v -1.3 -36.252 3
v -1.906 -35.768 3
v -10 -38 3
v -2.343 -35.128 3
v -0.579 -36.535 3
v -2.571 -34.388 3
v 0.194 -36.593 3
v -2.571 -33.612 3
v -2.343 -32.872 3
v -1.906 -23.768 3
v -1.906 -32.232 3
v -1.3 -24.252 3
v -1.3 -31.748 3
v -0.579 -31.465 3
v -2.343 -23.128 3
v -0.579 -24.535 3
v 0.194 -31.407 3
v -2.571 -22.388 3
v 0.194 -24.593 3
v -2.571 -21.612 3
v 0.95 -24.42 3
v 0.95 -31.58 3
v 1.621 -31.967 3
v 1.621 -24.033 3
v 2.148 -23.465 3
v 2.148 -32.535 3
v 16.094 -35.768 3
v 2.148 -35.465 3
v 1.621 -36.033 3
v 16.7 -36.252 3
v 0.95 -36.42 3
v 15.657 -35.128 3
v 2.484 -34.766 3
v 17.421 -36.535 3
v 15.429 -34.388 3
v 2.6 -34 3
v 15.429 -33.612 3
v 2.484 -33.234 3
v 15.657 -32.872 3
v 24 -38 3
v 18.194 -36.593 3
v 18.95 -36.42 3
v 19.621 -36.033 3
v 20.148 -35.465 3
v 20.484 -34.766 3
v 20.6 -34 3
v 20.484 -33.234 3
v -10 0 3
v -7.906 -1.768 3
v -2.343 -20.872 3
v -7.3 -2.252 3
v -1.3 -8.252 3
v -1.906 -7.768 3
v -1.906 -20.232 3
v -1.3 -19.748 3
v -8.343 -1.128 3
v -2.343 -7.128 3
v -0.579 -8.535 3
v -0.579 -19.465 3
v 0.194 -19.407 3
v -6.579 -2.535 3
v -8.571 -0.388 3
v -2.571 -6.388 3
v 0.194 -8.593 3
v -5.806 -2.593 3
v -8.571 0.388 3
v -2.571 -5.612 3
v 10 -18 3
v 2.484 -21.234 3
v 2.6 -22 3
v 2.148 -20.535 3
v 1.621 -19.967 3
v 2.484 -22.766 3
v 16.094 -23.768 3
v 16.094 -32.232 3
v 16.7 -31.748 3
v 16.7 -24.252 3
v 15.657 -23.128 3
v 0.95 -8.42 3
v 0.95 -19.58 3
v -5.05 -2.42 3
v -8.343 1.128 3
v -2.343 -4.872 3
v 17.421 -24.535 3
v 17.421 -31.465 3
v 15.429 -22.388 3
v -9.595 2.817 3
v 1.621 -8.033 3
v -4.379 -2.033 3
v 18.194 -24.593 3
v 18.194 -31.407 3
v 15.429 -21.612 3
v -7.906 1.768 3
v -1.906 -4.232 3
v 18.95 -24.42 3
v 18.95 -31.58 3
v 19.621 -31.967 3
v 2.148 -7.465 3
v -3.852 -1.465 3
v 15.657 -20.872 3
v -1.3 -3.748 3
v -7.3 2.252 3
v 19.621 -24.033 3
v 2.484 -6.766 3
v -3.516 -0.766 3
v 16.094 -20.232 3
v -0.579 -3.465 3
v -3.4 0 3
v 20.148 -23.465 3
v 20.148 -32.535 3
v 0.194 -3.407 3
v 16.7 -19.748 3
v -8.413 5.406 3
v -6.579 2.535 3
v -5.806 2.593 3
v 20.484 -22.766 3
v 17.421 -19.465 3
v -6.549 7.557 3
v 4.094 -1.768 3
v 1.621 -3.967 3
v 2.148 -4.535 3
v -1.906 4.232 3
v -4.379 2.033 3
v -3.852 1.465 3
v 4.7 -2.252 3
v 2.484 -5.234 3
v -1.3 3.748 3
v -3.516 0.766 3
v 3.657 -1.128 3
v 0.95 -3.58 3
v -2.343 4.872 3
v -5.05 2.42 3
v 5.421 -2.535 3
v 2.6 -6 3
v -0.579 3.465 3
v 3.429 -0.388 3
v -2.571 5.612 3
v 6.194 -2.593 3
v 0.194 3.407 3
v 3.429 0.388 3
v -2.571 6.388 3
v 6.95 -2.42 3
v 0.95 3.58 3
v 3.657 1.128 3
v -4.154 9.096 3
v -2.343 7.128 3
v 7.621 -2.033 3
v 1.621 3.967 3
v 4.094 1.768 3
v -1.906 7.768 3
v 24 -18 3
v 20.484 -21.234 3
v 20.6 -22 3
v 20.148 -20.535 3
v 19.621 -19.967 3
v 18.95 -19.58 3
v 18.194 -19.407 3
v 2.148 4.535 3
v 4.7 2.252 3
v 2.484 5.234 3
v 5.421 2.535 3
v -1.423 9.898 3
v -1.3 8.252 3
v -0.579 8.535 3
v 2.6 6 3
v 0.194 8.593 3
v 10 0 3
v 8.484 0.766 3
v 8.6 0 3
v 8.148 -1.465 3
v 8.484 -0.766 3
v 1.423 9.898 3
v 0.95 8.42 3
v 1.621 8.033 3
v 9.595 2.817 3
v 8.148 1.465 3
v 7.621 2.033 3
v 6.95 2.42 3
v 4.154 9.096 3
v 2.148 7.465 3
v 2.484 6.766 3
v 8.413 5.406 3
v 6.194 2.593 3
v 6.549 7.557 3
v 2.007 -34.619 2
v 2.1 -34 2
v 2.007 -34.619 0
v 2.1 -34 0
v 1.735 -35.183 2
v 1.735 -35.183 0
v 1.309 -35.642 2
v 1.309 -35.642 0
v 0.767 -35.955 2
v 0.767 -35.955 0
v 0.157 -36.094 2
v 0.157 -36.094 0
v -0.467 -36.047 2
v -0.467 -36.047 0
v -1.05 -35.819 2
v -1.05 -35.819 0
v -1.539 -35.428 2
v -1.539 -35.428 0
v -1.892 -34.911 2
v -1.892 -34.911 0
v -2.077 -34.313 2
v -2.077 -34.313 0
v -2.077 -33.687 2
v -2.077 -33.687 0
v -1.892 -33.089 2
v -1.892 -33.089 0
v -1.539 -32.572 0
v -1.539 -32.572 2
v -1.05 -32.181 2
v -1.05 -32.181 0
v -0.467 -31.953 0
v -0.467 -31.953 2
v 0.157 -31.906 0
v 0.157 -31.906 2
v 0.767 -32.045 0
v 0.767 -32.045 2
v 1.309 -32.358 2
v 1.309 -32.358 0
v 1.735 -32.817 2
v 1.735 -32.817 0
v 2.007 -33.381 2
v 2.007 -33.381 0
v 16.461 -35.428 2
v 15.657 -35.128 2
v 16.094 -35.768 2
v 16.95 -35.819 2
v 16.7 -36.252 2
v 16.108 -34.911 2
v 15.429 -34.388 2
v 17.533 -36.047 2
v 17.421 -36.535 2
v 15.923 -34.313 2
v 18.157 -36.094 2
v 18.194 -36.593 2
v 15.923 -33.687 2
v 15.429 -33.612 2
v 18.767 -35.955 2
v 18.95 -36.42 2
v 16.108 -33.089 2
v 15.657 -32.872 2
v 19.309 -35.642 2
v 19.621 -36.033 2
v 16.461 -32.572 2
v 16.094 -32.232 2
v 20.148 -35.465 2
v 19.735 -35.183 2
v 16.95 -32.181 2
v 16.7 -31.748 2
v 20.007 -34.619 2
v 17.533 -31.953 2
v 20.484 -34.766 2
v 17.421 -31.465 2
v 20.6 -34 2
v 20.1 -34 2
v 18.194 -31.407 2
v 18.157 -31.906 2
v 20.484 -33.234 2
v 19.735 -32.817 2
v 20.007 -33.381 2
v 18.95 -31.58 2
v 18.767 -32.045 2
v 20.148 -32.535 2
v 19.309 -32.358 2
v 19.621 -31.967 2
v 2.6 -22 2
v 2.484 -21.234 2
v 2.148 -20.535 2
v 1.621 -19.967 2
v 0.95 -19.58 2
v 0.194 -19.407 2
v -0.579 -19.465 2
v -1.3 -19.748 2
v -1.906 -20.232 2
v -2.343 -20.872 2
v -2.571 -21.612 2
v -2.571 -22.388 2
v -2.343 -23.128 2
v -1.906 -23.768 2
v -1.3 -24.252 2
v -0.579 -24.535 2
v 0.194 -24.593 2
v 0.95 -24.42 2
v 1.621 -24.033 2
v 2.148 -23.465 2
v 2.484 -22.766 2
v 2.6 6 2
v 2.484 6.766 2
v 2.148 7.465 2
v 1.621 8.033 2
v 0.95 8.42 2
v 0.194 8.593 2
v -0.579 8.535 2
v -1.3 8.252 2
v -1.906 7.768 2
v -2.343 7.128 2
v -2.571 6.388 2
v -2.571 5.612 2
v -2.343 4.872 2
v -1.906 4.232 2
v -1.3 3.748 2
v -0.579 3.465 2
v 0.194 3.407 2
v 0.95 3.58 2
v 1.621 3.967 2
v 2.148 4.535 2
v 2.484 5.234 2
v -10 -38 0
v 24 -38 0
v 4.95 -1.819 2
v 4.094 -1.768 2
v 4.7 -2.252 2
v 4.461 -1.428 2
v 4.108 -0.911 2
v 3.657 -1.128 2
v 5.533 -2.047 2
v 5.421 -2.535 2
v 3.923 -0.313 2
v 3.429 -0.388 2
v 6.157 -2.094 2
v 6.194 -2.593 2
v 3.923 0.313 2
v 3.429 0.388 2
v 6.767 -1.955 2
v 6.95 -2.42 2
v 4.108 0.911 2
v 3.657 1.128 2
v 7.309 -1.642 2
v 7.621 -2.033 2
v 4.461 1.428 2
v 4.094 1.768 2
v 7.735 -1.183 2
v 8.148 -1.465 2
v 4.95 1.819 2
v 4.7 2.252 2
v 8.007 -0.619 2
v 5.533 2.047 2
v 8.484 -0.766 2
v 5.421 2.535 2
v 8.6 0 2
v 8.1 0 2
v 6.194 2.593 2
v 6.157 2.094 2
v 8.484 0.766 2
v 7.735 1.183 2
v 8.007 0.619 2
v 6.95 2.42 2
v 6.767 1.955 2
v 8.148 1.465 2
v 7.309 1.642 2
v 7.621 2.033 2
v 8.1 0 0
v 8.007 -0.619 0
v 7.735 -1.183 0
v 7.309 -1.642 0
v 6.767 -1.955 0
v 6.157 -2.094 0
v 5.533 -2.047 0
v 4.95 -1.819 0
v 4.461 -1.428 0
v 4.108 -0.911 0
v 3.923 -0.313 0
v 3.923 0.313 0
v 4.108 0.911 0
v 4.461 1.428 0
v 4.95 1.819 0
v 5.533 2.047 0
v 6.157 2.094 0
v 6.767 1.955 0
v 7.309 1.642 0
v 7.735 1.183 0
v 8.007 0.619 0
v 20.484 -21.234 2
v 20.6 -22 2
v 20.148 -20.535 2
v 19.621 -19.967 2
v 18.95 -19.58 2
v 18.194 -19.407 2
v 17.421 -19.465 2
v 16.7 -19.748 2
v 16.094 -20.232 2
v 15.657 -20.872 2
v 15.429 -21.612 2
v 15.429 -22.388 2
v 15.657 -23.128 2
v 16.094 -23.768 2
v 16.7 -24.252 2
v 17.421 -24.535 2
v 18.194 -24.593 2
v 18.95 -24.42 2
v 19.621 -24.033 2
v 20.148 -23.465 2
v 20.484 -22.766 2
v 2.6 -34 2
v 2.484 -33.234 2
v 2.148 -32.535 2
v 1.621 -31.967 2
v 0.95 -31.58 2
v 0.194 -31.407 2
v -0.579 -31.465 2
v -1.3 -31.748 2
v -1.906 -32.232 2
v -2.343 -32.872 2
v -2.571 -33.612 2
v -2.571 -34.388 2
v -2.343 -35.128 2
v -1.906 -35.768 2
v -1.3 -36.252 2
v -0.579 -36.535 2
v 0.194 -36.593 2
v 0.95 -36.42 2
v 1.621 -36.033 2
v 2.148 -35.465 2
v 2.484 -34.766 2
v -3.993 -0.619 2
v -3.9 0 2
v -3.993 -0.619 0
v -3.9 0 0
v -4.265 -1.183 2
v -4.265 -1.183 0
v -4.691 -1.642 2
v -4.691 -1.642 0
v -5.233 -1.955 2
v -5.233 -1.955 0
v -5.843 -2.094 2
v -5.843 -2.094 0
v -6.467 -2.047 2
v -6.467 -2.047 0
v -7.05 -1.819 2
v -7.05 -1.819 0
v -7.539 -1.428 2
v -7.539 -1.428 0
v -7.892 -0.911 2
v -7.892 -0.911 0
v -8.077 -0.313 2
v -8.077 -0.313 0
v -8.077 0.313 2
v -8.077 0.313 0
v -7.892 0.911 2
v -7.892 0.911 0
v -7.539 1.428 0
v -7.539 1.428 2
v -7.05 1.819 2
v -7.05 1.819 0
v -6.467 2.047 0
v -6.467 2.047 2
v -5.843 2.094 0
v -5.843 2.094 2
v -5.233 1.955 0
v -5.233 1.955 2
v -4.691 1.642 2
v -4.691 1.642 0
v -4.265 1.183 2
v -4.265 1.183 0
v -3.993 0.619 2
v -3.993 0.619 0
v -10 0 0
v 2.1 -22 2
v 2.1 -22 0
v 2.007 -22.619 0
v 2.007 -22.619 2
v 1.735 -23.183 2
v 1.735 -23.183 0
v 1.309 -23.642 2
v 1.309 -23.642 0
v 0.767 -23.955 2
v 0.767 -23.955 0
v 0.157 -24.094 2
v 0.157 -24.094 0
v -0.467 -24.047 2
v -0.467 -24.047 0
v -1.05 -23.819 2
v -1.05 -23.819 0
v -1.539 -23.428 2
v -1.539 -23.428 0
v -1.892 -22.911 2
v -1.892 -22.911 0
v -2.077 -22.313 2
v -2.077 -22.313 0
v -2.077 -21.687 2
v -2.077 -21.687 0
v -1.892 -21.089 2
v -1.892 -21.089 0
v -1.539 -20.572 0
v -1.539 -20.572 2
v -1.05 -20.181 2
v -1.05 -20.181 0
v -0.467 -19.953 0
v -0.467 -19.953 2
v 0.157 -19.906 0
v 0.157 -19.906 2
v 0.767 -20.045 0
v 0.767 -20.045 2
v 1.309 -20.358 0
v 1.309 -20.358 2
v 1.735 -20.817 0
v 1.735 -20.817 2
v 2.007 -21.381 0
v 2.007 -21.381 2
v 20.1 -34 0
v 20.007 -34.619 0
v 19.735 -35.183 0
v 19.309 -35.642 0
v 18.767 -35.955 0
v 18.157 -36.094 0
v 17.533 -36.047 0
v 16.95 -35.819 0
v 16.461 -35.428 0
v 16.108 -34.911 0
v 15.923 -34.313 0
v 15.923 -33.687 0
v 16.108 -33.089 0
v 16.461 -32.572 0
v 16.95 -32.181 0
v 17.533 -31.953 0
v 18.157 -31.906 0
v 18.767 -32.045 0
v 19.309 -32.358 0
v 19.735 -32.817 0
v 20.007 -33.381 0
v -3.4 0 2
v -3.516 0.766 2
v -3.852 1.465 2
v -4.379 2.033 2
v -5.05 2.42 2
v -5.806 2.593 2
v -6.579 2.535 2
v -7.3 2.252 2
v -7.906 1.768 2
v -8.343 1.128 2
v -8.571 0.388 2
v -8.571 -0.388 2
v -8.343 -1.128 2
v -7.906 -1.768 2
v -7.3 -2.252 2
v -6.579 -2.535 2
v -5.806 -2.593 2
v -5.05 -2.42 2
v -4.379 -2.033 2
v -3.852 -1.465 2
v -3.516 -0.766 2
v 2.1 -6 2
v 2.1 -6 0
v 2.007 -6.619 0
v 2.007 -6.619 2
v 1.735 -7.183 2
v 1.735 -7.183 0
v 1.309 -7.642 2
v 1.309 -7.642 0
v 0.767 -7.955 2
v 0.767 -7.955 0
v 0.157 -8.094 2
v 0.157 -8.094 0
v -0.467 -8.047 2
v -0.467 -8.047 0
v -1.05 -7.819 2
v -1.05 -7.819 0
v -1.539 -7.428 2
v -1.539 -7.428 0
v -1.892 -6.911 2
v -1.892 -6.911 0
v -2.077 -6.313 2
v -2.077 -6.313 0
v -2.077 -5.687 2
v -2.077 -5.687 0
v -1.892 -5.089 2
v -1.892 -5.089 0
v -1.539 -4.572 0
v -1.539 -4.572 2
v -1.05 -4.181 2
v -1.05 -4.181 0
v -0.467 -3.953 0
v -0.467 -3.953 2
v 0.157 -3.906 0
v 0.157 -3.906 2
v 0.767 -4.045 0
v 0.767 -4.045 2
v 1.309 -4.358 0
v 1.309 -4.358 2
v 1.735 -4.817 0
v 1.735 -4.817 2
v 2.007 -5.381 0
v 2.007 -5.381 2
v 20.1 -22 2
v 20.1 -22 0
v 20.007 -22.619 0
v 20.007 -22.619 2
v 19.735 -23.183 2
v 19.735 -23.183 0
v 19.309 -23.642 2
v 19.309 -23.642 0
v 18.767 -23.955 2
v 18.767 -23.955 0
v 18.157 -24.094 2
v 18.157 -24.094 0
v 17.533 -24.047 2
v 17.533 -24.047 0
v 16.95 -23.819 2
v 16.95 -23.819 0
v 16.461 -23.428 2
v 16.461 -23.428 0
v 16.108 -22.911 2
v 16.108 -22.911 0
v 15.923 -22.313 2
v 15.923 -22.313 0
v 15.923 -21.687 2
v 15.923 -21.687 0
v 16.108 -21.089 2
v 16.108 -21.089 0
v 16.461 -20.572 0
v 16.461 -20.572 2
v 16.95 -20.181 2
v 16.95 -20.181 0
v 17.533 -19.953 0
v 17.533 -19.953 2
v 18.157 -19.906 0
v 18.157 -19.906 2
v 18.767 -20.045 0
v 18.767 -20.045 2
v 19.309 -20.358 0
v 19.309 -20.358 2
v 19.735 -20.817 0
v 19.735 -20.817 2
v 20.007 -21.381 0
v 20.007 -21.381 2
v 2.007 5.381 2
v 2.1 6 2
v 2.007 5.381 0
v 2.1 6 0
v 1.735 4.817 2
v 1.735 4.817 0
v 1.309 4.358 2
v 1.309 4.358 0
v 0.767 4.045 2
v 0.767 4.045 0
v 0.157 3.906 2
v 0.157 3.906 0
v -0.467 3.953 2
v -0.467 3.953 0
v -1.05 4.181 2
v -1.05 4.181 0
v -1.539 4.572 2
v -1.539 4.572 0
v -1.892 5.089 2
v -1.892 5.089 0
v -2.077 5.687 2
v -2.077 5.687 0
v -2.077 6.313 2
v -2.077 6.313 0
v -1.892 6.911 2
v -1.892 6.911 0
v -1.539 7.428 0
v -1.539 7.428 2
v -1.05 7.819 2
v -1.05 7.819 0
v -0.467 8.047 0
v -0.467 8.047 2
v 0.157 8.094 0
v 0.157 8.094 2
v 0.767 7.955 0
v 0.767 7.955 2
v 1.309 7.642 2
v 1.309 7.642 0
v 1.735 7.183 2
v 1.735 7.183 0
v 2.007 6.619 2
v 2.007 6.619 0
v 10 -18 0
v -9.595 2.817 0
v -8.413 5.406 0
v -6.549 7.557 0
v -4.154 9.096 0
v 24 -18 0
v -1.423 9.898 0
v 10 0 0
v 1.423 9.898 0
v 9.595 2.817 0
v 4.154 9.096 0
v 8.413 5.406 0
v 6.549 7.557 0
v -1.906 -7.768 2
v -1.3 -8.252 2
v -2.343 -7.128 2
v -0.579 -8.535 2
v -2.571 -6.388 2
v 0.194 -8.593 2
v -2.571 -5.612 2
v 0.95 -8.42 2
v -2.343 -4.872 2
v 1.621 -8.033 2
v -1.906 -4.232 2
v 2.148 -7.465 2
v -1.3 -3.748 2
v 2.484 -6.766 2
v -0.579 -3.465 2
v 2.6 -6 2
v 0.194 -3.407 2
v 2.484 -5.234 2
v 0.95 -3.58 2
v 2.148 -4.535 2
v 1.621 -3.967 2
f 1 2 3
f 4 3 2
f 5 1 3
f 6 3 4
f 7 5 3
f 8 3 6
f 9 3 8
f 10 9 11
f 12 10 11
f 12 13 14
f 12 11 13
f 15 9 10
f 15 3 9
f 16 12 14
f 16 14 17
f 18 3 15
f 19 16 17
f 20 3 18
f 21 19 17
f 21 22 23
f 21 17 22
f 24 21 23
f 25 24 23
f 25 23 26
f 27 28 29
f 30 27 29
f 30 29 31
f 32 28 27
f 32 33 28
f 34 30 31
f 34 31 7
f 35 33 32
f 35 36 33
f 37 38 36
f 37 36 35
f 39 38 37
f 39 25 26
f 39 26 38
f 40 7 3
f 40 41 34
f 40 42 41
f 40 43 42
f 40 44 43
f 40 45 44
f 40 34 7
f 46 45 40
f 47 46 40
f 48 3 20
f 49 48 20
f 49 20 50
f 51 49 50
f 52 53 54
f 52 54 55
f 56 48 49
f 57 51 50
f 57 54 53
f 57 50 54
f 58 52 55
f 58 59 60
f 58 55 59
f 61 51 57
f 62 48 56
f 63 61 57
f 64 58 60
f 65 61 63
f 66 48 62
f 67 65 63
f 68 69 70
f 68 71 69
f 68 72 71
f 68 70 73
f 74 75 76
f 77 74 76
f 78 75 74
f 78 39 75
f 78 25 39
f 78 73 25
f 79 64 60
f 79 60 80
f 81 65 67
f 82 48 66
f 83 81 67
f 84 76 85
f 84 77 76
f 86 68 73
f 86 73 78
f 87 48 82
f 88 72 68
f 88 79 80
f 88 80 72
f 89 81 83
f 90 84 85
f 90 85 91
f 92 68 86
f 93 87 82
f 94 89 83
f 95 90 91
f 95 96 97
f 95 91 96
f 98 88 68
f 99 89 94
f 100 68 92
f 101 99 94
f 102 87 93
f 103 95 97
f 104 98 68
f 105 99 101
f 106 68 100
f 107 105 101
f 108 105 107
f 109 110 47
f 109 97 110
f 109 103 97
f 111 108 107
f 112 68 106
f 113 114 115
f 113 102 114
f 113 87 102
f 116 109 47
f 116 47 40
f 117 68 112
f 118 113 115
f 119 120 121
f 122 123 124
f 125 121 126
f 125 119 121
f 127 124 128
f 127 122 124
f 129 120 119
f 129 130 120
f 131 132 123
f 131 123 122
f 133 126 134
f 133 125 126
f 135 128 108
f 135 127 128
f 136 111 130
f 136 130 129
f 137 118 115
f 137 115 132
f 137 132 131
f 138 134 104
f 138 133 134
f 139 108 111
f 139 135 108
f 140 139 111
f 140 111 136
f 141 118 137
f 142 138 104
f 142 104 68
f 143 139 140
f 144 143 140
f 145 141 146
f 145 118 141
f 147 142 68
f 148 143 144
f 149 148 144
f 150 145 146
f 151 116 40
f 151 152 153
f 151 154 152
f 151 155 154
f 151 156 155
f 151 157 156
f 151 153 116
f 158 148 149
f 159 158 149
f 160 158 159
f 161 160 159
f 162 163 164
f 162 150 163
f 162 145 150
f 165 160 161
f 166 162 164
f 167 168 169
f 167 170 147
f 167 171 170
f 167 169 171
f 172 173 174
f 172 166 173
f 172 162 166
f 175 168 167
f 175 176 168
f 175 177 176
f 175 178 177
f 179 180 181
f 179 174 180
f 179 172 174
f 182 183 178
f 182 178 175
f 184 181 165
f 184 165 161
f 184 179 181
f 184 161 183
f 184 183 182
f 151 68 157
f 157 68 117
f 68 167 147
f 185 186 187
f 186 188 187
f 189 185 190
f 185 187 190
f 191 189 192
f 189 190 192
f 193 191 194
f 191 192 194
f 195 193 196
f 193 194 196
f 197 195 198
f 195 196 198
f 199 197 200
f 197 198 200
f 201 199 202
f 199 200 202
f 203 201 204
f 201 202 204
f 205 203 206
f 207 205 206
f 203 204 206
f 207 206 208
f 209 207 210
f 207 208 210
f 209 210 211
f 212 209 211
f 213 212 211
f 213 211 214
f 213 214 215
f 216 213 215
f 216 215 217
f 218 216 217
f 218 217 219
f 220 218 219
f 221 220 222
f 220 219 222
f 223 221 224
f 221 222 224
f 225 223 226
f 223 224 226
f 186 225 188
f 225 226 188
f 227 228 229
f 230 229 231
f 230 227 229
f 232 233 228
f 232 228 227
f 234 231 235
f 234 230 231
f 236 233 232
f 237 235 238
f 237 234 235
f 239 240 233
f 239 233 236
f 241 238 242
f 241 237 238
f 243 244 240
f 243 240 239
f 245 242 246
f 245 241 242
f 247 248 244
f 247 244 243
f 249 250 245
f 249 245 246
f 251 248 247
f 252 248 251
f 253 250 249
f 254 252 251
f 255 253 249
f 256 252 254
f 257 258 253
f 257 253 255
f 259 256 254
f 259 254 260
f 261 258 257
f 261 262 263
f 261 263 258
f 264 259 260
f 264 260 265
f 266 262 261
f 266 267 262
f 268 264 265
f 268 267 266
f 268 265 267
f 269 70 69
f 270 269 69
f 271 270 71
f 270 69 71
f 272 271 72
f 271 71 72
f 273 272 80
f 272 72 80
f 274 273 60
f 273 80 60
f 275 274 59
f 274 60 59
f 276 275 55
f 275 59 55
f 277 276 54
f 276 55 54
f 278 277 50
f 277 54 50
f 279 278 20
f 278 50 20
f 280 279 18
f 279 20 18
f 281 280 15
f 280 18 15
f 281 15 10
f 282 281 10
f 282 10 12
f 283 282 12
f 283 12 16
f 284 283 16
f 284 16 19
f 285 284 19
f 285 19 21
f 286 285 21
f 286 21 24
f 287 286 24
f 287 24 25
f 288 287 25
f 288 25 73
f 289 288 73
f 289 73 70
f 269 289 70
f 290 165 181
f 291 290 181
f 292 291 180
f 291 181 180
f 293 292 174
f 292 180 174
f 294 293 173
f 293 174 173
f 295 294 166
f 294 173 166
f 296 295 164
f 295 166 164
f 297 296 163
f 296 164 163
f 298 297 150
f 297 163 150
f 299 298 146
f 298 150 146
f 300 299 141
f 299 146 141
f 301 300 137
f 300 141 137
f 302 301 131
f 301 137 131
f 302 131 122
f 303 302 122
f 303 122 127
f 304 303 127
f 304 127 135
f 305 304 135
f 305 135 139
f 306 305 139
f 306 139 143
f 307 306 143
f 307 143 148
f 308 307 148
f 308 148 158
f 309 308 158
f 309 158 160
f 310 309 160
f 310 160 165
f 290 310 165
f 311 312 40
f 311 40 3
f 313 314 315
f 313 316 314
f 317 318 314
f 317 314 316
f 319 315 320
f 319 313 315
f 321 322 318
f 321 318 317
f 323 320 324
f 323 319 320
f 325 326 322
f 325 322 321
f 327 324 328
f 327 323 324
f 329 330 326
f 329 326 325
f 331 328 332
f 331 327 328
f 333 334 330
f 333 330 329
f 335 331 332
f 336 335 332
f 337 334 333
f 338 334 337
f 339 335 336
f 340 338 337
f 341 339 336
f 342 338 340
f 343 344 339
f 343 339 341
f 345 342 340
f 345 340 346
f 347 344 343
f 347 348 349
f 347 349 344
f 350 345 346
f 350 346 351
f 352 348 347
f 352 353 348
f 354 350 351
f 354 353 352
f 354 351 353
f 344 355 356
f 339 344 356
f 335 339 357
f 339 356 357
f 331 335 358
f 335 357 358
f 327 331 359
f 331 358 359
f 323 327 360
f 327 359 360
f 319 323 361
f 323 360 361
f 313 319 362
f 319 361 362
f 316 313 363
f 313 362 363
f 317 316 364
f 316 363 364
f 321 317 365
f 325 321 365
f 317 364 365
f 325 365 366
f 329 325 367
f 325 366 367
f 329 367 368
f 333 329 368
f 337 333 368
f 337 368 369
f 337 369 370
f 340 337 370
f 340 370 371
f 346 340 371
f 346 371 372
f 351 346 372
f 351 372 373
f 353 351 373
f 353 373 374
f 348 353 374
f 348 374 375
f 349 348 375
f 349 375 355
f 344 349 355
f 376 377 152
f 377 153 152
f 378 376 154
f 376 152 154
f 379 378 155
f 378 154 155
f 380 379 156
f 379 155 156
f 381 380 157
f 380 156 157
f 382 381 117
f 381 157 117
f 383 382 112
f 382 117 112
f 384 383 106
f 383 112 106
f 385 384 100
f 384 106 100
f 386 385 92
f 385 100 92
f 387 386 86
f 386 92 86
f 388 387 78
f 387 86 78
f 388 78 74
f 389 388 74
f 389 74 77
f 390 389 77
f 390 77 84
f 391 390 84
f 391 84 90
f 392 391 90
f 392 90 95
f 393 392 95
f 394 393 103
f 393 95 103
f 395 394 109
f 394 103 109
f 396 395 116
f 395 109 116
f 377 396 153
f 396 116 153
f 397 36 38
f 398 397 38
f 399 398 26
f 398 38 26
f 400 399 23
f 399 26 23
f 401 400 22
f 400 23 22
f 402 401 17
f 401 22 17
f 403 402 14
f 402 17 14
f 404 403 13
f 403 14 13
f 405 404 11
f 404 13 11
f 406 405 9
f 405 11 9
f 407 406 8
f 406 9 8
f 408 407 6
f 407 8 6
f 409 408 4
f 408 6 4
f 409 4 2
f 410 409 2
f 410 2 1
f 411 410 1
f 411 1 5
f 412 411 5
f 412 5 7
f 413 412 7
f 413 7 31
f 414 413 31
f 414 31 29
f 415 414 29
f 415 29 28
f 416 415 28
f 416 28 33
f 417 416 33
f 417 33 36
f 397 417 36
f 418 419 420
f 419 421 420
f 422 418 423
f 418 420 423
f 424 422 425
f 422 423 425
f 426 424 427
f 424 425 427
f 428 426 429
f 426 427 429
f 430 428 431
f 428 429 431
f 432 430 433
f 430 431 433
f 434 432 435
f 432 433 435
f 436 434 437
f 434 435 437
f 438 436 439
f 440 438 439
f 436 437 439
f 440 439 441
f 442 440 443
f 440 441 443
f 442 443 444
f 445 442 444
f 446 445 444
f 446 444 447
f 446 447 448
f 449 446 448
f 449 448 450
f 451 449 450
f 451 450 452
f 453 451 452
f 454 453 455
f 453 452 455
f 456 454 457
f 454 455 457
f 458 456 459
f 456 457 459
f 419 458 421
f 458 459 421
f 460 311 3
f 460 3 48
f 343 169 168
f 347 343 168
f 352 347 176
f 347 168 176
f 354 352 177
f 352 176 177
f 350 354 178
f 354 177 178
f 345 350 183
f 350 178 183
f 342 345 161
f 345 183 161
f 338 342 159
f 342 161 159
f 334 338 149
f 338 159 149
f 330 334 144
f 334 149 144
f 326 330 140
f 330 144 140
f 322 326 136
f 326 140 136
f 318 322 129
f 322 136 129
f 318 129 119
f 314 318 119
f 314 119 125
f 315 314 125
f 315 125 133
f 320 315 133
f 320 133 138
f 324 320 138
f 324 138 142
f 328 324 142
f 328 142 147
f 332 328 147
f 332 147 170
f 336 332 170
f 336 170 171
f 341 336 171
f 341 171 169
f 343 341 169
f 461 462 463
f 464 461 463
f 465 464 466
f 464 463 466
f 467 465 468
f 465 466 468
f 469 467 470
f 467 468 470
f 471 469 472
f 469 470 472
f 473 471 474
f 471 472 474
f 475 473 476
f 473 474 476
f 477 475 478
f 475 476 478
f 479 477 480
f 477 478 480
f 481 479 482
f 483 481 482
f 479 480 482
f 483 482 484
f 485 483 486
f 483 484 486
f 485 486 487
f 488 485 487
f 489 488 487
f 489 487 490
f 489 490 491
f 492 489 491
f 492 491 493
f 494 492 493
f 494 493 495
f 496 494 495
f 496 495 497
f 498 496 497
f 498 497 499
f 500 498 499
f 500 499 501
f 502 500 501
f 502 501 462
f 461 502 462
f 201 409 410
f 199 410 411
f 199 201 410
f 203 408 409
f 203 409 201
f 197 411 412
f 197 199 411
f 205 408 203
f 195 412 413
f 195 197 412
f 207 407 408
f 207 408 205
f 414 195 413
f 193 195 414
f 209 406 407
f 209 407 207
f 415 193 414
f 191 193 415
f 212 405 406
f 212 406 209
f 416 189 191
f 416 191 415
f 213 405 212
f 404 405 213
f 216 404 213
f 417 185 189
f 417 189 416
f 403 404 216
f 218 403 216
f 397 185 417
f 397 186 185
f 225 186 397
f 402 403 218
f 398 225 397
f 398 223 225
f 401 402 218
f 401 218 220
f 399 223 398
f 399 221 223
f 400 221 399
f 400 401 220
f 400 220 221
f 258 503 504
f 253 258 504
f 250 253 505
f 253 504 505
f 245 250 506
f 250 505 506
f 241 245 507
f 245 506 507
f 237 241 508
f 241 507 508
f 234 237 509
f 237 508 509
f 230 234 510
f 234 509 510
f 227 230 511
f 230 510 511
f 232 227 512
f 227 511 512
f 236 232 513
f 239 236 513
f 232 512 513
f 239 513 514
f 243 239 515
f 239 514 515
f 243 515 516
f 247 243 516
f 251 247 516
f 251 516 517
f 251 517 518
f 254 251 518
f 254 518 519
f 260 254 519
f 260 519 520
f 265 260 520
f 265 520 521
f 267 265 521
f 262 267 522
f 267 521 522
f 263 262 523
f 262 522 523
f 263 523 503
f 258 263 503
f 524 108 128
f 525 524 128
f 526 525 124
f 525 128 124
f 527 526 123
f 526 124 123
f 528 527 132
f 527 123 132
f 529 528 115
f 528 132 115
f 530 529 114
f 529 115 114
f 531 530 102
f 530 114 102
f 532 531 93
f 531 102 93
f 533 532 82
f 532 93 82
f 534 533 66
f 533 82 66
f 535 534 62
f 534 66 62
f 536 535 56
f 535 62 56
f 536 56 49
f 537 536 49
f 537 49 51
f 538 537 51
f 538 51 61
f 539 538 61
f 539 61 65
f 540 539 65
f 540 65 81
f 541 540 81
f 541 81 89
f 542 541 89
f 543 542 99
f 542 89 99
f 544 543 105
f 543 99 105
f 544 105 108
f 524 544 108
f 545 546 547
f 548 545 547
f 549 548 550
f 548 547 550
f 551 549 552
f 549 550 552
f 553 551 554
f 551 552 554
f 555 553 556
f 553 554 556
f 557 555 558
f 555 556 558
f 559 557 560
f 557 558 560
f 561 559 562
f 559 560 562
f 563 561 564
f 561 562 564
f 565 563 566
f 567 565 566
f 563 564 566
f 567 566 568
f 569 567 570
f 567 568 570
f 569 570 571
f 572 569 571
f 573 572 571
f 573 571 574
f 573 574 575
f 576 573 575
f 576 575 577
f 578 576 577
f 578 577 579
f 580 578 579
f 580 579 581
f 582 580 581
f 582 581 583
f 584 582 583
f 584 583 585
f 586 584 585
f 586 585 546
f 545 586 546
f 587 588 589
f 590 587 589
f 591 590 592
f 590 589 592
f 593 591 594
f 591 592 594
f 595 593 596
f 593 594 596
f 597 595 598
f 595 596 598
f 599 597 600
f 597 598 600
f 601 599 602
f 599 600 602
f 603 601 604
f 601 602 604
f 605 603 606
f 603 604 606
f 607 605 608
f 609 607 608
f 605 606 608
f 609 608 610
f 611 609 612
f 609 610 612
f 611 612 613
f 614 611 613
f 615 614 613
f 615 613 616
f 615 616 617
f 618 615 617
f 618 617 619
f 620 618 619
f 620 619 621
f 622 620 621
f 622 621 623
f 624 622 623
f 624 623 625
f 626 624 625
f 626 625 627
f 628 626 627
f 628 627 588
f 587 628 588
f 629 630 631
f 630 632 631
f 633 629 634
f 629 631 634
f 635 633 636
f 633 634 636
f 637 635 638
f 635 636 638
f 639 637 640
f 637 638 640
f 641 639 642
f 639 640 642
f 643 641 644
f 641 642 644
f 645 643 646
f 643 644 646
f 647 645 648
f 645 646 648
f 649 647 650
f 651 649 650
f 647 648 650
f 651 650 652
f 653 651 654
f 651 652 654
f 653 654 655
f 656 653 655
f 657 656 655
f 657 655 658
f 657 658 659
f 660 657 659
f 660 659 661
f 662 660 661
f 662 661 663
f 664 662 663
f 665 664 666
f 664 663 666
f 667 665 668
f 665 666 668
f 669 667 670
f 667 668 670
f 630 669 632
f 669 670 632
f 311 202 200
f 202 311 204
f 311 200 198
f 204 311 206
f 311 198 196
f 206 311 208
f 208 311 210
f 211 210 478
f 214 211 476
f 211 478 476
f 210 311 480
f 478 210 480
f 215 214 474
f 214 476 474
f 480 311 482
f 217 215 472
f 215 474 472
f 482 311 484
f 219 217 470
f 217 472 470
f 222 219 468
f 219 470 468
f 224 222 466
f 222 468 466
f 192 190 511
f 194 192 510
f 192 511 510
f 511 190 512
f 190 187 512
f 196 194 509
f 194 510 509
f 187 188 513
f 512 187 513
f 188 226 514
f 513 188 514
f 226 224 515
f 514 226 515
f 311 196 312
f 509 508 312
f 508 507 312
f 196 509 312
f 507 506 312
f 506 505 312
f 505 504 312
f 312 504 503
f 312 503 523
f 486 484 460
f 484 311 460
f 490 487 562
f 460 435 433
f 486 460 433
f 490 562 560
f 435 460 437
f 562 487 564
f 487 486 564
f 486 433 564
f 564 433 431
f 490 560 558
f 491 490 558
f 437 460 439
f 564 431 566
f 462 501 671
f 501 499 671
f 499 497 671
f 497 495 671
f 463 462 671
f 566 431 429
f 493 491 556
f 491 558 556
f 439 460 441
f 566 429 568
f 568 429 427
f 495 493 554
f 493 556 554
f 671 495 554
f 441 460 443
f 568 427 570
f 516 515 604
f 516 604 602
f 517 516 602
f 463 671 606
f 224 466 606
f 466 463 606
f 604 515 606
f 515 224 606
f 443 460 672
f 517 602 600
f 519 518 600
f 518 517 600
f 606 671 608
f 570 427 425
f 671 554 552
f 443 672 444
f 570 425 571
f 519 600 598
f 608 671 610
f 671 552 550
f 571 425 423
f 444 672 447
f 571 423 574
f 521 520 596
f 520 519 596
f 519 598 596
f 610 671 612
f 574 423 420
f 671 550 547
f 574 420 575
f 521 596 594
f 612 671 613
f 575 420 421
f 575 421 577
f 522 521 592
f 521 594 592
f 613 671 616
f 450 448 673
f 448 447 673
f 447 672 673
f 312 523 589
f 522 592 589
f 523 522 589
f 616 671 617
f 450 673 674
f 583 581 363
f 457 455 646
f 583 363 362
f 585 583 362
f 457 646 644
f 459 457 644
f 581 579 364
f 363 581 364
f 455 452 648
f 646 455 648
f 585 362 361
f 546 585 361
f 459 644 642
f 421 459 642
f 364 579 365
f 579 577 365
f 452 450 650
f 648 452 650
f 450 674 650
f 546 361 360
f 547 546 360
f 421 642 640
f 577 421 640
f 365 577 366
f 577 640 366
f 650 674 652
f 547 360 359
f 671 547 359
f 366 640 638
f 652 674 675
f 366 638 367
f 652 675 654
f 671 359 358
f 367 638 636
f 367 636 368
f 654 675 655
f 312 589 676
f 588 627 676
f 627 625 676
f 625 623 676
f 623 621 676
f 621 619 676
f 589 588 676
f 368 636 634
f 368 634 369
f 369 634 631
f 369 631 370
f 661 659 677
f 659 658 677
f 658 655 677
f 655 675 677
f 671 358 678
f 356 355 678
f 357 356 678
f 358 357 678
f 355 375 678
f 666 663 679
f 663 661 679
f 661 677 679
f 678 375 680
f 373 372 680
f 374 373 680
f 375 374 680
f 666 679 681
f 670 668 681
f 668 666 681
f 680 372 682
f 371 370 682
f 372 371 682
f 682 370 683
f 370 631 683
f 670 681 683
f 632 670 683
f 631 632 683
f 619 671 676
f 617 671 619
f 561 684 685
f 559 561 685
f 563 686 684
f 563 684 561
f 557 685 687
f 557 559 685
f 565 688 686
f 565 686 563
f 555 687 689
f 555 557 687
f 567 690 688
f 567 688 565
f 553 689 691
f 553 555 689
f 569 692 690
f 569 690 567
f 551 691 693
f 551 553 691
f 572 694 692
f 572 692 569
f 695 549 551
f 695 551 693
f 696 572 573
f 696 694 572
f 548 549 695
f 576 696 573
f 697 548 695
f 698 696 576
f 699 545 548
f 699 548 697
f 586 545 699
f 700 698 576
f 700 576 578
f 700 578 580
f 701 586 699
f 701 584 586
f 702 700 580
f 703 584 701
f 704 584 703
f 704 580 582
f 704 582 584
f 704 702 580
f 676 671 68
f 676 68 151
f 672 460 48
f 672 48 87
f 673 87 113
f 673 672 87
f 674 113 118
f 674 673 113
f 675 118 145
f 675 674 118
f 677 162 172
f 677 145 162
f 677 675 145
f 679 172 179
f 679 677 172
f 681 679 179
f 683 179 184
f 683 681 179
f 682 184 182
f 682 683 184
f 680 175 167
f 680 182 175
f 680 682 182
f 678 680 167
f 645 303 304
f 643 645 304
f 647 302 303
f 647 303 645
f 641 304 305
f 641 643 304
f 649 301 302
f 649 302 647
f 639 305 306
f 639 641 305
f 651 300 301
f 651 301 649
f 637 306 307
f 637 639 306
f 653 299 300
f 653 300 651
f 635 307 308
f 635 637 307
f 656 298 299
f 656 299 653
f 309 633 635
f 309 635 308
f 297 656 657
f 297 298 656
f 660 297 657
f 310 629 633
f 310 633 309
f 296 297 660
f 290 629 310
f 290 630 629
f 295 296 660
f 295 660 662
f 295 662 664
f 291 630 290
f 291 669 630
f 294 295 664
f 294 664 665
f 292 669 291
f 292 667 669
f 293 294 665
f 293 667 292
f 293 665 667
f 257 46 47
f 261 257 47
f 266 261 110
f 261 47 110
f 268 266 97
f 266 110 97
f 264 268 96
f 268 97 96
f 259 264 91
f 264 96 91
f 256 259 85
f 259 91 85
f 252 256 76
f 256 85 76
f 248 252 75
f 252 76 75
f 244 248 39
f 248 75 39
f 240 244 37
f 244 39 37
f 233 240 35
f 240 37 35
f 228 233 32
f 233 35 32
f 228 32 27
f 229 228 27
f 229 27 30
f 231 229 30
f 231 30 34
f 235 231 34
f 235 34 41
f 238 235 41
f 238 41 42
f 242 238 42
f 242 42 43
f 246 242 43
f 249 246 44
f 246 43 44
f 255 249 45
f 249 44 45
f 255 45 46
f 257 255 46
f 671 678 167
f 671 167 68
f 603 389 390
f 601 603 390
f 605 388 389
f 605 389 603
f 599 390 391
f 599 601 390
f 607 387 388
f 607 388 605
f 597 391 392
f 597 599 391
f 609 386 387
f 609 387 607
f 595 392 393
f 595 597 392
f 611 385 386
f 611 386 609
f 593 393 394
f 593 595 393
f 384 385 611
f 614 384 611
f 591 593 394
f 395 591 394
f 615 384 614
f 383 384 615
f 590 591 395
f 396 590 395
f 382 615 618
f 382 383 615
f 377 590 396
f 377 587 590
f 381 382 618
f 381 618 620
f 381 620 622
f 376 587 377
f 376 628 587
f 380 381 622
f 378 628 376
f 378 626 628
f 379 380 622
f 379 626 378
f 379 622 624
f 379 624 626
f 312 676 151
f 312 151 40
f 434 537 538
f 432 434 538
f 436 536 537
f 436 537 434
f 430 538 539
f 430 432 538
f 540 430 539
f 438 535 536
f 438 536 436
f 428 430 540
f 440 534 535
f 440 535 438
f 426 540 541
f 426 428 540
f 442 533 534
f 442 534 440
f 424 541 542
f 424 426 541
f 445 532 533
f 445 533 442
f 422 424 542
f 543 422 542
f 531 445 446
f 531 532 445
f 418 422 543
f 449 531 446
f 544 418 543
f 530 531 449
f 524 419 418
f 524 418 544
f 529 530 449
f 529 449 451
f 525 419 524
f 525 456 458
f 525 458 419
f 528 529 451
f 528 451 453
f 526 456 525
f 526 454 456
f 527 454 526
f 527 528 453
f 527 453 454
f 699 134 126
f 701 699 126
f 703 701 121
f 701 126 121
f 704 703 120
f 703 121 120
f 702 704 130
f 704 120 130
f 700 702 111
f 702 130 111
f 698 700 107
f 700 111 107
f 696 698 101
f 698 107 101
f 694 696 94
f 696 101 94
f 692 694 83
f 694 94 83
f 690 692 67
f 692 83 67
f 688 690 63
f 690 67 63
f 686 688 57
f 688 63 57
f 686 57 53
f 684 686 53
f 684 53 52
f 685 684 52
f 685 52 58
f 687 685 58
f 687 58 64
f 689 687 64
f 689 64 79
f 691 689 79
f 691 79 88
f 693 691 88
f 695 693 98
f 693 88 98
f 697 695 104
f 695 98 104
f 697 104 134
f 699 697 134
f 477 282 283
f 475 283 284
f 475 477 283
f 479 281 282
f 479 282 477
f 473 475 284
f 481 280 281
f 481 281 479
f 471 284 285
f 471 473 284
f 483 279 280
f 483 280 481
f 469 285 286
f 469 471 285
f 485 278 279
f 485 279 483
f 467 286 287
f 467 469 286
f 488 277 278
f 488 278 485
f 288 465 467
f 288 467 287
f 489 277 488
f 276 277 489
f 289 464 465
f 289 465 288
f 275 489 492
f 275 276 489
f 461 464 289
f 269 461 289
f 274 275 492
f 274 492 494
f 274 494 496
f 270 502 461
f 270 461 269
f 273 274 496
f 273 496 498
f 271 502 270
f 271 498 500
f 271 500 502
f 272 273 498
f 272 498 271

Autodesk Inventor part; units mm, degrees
ref_plane "YZ Plane" through (0, 0, 0) normal (1, 0, 0) x (0, 1, 0)
ref_plane "XZ Plane" through (0, 0, 0) normal (0, 1, 0) x (-1, 0, 0)
ref_plane "XY Plane" through (0, 0, 0) normal (0, 0, 1) x (1, 0, 0)
sketch "Sketch1" plane through (0, 0, 0) normal (0, 0, 1) x (1, 0, 0)
  circle A0 centre (0, 0) radius 10
  line L0 (10, 0) -> (10, -38)
  line L1 (10, -38) -> (-10, -38)
  line L2 (-10, -38) -> (-10, 0)
  circle A1 centre (0, 6) radius 2.1
  circle A2 centre (-6, 0) radius 2.1
  circle A3 centre (6, 0) radius 2.1
  circle A4 centre (0, -6) radius 2.1
  circle A5 centre (0, -22) radius 2.1
  circle A6 centre (0, -34) radius 2.1
  line L3 (10, -18) -> (24, -18)
  line L4 (24, -18) -> (24, -38)
  line L5 (24, -38) -> (10, -38)
  line L6 (10, -38) -> (10, -18)
  circle A7 centre (18, -22) radius 2.1
  circle A8 centre (18, -34) radius 2.1
  line L7 (-10, 0) -> (-8.1, 0)
  line L8 (-3.9, 0) -> (3.9, 0)
  line L9 (8.1, 0) -> (10, 0)
  dimension "d0" = 20
  dimension "d1" = 38
  dimension "d2" = 4.2
  dimension "d3" = 4.2
  dimension "d4" = 4.2
  dimension "d5" = 4.2
  dimension "d6" = 4.2
  dimension "d7" = 4.2
  dimension "d8" = 14
  dimension "d9" = 4.2
  dimension "d10" = 4.2
extrude "Extrusion1" add sketch "Sketch1" along normal blind 3 contours L9 A3 L8 A2 L7 A0 | L0 L1 L2 A0 | A0 L7 A2 L8 A3 L9 | L3 L4 L5 L0
sketch "Sketch2" plane through (0, 0, 3) normal (0, 0, 1) x (1, 0, 0)
  circle A0 centre (0, 6) radius 2.6
  circle A1 centre (-6, 0) radius 2.6
  circle A2 centre (6, 0) radius 2.6
  circle A3 centre (0, -6) radius 2.6
  circle A4 centre (0, -22) radius 2.6
  circle A5 centre (0, -34) radius 2.6
  circle A6 centre (18, -22) radius 2.6
  circle A7 centre (18, -34) radius 2.6
  point P0 (0, 0)
  dimension "d13" = 5.2
  dimension "d14" = 5.2
  dimension "d15" = 5.2
  dimension "d16" = 5.2
  dimension "d17" = 5.2
  dimension "d18" = 5.2
  dimension "d19" = 5.2
  dimension "d20" = 5.2
extrude "Extrusion2" cut sketch "Sketch2" against normal blind 1
properties part number "Wheel_holder"
